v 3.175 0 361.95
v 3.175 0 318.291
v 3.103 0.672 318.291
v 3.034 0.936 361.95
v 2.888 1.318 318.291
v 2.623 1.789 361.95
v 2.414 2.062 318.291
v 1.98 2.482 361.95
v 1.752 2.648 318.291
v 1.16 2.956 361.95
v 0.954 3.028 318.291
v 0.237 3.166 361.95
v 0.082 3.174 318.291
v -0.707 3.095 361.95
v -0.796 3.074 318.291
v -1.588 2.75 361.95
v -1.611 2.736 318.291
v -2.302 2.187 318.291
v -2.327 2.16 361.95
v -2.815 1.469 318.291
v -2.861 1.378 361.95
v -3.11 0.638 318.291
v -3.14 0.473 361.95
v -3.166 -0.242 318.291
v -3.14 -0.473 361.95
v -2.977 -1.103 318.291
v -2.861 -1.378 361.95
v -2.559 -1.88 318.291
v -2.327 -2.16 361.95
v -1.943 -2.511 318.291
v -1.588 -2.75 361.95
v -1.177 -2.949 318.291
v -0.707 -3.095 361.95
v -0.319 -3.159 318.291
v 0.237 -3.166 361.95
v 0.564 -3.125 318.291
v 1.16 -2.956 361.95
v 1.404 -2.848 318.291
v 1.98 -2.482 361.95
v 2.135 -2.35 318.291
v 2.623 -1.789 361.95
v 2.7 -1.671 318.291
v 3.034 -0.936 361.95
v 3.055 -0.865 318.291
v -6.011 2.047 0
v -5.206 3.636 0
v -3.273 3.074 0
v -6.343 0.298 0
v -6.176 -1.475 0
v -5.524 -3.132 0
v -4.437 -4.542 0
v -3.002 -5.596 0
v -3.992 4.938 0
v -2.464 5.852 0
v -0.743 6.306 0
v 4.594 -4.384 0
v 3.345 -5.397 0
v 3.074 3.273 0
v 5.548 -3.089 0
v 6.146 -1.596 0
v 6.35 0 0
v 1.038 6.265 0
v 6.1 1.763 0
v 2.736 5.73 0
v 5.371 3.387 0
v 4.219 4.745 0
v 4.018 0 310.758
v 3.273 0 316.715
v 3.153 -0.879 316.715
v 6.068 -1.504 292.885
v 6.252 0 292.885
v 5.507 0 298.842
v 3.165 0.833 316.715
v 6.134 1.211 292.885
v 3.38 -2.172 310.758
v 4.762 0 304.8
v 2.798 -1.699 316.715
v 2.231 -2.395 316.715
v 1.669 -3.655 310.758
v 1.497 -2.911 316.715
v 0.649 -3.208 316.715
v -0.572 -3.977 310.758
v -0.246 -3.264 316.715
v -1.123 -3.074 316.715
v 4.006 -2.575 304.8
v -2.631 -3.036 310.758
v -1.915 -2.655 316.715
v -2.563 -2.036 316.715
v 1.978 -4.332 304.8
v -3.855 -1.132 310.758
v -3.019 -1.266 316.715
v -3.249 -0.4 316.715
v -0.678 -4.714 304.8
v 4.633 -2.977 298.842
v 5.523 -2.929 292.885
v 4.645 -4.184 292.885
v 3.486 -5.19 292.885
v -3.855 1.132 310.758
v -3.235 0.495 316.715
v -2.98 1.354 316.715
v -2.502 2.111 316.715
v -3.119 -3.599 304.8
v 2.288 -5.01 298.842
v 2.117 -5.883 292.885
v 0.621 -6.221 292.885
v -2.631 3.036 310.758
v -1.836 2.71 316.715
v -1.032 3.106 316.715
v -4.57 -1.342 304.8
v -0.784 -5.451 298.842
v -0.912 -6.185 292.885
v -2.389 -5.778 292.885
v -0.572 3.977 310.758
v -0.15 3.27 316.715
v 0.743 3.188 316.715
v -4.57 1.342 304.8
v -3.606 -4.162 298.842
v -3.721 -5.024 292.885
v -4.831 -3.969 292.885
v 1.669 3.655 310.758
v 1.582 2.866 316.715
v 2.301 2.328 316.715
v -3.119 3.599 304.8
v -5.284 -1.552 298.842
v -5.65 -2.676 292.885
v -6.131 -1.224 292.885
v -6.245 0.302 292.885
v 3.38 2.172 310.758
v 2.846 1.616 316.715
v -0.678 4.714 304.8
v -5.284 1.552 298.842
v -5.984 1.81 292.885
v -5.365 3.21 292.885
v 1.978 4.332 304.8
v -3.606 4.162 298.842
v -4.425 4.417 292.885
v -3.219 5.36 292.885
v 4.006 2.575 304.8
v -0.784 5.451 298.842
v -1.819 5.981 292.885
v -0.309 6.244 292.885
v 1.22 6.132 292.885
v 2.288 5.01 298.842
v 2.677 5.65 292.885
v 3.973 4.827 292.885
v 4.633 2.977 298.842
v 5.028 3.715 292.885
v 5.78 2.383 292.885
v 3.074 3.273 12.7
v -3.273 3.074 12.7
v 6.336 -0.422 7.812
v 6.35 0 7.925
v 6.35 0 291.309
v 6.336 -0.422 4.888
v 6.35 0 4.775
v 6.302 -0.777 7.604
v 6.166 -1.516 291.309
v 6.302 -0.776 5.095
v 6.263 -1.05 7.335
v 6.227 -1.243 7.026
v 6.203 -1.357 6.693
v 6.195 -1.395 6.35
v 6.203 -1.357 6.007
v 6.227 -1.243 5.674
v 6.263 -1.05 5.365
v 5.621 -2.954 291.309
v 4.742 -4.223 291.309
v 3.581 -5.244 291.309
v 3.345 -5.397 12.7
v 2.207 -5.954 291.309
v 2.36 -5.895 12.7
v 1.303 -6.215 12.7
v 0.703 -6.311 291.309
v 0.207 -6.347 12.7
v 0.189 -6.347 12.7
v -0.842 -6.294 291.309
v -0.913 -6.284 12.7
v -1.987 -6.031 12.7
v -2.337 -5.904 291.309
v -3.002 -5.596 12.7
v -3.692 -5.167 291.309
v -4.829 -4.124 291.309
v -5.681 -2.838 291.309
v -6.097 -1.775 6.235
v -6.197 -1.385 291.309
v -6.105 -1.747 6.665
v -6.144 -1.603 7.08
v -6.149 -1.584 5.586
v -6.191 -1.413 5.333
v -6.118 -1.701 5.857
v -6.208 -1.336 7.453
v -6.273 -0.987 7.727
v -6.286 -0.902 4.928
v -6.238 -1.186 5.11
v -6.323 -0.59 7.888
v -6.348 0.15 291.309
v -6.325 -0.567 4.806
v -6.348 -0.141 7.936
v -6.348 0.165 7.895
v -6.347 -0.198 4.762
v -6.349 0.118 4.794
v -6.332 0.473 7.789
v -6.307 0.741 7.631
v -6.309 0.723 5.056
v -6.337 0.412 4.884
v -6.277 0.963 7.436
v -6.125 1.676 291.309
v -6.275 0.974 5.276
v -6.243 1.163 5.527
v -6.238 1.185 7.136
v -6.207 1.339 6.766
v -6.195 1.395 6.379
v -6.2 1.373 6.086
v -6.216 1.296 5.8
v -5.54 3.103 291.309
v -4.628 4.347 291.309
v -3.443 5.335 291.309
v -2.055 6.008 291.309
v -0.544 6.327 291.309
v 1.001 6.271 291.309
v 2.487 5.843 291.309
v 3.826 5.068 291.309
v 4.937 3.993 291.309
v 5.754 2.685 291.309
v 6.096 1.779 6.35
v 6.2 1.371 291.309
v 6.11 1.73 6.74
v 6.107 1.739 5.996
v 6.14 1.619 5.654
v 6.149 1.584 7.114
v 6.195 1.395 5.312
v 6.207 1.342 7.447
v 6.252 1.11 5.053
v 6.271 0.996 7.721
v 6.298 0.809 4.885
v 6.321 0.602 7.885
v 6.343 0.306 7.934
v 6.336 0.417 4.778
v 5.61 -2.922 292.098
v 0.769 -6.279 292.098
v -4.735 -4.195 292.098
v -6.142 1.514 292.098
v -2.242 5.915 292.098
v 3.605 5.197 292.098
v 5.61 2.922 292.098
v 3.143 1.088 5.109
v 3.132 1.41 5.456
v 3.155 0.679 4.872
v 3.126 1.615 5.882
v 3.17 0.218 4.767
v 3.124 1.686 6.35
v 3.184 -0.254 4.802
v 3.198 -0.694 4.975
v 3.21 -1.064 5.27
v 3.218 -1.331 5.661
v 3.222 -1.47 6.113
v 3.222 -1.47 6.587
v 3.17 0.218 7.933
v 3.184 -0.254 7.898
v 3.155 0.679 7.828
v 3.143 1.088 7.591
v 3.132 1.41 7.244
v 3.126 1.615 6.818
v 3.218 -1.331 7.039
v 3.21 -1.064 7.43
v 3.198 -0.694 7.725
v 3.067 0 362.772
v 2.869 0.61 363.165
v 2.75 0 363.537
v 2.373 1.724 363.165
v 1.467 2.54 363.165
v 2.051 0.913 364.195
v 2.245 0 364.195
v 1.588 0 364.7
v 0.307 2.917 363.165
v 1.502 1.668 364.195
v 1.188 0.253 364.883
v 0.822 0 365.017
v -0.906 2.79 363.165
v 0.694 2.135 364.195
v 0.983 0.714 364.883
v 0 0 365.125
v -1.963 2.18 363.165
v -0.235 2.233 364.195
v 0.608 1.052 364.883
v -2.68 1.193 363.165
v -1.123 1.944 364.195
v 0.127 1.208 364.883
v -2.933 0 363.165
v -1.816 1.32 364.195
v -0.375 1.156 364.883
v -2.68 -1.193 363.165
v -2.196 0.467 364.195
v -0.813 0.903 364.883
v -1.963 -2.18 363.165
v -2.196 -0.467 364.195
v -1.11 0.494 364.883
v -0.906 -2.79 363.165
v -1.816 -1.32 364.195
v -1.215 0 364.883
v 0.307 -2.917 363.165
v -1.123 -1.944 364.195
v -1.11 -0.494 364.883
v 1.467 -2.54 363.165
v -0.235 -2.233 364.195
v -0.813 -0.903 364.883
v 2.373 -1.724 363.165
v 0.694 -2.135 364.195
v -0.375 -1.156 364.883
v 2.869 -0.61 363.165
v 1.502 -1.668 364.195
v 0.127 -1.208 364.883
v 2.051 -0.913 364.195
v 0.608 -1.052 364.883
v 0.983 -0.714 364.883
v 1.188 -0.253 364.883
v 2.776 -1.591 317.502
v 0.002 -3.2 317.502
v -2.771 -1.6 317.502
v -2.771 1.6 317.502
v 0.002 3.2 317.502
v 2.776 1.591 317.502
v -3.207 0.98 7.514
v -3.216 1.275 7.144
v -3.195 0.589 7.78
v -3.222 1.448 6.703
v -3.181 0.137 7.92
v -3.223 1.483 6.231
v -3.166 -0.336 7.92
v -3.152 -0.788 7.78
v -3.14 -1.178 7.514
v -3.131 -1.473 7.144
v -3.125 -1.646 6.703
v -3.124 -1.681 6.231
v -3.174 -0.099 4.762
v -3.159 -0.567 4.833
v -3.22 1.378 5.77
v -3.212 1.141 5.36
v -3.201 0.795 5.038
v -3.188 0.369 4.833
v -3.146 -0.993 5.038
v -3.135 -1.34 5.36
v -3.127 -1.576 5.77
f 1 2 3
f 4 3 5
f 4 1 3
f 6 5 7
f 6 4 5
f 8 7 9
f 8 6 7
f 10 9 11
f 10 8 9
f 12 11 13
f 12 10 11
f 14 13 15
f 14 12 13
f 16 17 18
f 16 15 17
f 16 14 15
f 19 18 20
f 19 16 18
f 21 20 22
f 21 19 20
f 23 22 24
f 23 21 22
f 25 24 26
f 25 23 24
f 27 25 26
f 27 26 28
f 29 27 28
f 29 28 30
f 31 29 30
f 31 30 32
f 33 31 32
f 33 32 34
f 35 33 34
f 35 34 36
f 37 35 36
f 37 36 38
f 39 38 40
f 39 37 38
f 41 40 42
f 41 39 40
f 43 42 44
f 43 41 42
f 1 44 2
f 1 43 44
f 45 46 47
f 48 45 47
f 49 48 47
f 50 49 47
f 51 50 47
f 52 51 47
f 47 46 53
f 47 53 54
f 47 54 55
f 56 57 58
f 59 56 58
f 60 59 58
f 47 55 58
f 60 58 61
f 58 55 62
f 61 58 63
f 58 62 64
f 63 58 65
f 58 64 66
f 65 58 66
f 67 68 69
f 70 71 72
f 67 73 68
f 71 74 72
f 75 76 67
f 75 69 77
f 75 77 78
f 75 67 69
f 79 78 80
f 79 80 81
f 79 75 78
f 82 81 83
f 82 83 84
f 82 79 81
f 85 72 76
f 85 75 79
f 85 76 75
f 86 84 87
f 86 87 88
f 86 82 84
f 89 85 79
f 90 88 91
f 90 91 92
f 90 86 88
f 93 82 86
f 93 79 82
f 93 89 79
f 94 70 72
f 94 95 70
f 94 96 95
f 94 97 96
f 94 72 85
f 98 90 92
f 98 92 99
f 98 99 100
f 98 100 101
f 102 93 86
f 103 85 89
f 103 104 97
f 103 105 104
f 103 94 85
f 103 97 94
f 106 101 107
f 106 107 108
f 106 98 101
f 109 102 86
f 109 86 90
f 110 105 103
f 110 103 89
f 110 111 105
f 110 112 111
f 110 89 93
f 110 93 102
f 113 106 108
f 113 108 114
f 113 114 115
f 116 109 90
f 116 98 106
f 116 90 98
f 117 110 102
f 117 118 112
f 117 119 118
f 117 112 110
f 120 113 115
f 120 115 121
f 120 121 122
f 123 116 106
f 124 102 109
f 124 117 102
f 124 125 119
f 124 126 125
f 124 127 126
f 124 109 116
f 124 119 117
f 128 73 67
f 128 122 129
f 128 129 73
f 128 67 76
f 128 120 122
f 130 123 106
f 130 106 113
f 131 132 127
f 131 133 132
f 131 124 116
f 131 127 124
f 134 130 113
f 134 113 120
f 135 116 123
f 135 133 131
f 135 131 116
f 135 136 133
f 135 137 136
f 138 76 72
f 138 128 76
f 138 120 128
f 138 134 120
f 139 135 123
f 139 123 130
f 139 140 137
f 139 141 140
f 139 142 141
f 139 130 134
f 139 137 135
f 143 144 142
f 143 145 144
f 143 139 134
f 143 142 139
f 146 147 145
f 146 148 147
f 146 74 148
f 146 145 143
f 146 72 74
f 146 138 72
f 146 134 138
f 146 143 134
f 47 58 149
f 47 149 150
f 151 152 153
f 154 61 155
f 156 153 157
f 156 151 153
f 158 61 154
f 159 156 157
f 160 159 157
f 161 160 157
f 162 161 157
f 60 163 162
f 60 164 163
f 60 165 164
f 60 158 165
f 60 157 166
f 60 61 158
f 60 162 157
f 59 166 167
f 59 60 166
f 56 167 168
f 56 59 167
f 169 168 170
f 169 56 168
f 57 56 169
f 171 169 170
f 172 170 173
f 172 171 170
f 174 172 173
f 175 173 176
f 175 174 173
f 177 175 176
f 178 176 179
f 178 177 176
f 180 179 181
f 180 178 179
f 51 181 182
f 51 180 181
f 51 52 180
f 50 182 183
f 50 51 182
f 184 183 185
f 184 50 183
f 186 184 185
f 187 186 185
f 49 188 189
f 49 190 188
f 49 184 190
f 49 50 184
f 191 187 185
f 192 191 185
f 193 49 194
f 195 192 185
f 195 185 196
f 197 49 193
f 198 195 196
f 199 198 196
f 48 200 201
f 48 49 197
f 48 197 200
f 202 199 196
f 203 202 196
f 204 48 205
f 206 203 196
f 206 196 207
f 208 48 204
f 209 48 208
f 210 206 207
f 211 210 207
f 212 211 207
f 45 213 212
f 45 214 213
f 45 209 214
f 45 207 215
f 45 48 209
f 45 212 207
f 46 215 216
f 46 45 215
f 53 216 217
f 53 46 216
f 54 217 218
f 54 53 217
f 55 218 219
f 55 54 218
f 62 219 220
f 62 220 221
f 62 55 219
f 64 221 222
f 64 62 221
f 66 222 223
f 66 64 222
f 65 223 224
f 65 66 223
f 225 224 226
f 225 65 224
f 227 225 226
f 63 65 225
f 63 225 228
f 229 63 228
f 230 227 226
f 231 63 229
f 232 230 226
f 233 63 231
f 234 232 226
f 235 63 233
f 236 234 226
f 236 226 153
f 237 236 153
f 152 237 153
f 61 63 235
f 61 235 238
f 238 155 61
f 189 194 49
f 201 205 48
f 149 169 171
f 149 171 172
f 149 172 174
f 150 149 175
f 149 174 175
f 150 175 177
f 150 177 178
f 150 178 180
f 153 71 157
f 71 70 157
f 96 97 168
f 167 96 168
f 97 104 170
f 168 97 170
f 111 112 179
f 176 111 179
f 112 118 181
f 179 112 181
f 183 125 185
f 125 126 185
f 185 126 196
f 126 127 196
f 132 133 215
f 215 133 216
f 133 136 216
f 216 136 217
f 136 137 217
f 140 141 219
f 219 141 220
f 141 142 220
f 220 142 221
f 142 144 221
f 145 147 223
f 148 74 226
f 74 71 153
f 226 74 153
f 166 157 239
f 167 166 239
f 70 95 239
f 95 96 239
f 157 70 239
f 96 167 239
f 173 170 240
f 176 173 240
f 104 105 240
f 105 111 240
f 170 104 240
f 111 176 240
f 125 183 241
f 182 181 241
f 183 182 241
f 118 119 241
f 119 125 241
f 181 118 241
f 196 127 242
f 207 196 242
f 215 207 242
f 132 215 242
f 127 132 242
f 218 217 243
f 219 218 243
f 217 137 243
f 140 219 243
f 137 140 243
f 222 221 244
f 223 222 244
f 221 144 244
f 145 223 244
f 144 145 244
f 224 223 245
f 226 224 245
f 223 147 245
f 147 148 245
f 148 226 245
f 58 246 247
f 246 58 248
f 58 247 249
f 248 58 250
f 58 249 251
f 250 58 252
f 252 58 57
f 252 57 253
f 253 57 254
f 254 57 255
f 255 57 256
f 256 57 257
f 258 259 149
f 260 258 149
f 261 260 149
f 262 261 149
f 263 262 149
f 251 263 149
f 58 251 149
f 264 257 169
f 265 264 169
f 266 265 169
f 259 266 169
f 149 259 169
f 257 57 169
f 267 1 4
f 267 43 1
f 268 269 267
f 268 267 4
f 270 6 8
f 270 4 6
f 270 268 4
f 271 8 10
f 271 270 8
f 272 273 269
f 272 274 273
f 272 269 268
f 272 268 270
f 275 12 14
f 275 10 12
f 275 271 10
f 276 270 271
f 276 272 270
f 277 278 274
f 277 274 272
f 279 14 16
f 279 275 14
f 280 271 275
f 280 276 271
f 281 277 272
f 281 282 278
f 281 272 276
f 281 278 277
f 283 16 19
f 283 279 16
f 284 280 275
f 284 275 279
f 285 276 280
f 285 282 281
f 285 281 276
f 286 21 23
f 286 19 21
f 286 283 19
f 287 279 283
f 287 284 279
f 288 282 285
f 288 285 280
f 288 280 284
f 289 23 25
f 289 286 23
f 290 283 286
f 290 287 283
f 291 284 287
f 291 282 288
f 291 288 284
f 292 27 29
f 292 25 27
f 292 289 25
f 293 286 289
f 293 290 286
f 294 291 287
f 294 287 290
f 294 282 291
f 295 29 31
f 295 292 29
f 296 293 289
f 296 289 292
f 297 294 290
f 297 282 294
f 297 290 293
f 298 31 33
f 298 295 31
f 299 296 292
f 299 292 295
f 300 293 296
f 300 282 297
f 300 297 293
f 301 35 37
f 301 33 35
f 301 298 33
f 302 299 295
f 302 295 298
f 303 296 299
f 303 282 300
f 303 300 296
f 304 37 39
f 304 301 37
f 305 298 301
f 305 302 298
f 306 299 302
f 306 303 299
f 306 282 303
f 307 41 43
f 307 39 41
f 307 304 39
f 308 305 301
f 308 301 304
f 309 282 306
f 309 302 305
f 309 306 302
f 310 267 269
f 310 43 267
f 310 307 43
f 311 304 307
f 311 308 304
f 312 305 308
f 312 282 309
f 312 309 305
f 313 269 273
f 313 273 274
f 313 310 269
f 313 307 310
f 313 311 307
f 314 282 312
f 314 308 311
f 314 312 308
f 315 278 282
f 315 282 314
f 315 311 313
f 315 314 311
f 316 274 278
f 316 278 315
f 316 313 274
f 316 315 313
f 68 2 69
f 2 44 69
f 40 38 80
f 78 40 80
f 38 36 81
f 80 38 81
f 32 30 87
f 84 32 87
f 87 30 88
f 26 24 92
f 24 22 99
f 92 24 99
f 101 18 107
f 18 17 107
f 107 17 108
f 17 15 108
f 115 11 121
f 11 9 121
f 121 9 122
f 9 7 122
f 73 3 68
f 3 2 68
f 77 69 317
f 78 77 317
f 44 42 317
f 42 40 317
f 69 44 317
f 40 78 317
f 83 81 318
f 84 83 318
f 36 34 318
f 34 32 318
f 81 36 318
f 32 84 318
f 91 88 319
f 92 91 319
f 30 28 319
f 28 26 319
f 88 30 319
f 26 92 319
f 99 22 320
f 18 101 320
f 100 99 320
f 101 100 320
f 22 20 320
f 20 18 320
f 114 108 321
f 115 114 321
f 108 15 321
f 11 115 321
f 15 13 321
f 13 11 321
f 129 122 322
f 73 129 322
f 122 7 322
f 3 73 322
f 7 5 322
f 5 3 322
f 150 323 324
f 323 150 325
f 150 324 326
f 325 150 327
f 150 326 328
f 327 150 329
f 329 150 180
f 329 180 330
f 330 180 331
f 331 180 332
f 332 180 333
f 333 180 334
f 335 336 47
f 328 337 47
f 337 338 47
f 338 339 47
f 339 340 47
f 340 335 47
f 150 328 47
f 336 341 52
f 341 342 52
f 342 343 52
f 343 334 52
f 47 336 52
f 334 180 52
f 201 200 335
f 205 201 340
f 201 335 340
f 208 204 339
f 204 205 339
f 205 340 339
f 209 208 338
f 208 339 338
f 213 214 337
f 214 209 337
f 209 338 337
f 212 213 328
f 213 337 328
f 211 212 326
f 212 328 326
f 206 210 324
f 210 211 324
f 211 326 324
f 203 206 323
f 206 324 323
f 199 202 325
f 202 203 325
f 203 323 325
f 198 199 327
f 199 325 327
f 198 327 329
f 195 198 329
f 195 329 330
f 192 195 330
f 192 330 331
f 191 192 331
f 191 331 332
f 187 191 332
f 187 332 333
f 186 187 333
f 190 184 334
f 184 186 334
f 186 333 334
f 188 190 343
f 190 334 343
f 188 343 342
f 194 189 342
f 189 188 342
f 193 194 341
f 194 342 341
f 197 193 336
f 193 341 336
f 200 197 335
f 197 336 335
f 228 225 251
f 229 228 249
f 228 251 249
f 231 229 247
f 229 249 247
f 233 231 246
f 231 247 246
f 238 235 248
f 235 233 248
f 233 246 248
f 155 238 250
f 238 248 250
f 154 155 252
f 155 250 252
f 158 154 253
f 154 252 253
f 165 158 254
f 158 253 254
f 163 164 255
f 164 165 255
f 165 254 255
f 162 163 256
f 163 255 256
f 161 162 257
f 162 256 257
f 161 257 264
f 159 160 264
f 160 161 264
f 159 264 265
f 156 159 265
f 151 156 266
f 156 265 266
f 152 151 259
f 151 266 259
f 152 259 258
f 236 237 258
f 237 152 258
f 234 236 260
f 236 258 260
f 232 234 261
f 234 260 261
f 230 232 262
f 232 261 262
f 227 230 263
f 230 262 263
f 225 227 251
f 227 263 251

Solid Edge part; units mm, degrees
sketch "Sketch1" plane through (0, 0, 0) normal (0, 0, 1) x (1, 0, 0)
  circle A0 centre (0, 0) radius 6.35
extrude "Protrusion1" add sketch "Sketch1" along normal blind 365.125
sketch "Sketch2" plane through (0, 0, 0) normal (0, -1, 0) x (1, 0, 0)
  line L0 (6.35, 365.125) -> (6.35, 292.1)
  line L1 (6.35, 292.1) -> (3.175, 317.5)
  line L2 (3.175, 317.5) -> (3.175, 365.125)
  line L3 (3.175, 365.125) -> (6.35, 365.125)
revolve "RevolvedCutout1" cut sketch "Sketch2" angle 360 about axis through (0, 0, 365.125) along (0, 0, -1)
fillet "Round_1" radius 3.175 1 edges at (-3.175, 0, 365.125)
fillet "Round_3" radius 12.7 2 edges at (-3.175, 0, 317.5) (-6.35, 0, 292.1)
sketch "Sketch3" plane through (0.1982, -6.3469, 145.6547) normal (0.0312188, -0.9995126, 0) x (0, 0, -1)
  line L0 (145.6547, 3.175) -> (132.9547, 3.175)
  line L1 (132.9547, 3.175) -> (132.9547, -3.175)
  line L2 (132.9547, -3.175) -> (145.6547, -3.175)
  line L3 (145.6547, -3.175) -> (145.6547, 3.175)
  dimension "D1" = 3.175
  dimension "D2" = 3.175
  dimension "D3" = 12.7
extrude "ExtrudedCutout_1" cut sketch "Sketch3" against normal blind 9.525
hole "Hole_1" at (-3.1735, -0.0991, 6.35) direction (-0.9995126, -0.0312188, 0) diameter 3.175 end up to next
sketch "Sketch4" plane through (-3.1372, -1.2607, 6.35) normal (0.9995126, 0.0312188, 0) x (-0.0312188, 0.9995126, 0)
  circle A0 centre (1.1621, 0) radius 1.5875
extrude "Cutout1" cut sketch "Sketch4" along normal through all
properties material "ABS Plastic, high impact"
